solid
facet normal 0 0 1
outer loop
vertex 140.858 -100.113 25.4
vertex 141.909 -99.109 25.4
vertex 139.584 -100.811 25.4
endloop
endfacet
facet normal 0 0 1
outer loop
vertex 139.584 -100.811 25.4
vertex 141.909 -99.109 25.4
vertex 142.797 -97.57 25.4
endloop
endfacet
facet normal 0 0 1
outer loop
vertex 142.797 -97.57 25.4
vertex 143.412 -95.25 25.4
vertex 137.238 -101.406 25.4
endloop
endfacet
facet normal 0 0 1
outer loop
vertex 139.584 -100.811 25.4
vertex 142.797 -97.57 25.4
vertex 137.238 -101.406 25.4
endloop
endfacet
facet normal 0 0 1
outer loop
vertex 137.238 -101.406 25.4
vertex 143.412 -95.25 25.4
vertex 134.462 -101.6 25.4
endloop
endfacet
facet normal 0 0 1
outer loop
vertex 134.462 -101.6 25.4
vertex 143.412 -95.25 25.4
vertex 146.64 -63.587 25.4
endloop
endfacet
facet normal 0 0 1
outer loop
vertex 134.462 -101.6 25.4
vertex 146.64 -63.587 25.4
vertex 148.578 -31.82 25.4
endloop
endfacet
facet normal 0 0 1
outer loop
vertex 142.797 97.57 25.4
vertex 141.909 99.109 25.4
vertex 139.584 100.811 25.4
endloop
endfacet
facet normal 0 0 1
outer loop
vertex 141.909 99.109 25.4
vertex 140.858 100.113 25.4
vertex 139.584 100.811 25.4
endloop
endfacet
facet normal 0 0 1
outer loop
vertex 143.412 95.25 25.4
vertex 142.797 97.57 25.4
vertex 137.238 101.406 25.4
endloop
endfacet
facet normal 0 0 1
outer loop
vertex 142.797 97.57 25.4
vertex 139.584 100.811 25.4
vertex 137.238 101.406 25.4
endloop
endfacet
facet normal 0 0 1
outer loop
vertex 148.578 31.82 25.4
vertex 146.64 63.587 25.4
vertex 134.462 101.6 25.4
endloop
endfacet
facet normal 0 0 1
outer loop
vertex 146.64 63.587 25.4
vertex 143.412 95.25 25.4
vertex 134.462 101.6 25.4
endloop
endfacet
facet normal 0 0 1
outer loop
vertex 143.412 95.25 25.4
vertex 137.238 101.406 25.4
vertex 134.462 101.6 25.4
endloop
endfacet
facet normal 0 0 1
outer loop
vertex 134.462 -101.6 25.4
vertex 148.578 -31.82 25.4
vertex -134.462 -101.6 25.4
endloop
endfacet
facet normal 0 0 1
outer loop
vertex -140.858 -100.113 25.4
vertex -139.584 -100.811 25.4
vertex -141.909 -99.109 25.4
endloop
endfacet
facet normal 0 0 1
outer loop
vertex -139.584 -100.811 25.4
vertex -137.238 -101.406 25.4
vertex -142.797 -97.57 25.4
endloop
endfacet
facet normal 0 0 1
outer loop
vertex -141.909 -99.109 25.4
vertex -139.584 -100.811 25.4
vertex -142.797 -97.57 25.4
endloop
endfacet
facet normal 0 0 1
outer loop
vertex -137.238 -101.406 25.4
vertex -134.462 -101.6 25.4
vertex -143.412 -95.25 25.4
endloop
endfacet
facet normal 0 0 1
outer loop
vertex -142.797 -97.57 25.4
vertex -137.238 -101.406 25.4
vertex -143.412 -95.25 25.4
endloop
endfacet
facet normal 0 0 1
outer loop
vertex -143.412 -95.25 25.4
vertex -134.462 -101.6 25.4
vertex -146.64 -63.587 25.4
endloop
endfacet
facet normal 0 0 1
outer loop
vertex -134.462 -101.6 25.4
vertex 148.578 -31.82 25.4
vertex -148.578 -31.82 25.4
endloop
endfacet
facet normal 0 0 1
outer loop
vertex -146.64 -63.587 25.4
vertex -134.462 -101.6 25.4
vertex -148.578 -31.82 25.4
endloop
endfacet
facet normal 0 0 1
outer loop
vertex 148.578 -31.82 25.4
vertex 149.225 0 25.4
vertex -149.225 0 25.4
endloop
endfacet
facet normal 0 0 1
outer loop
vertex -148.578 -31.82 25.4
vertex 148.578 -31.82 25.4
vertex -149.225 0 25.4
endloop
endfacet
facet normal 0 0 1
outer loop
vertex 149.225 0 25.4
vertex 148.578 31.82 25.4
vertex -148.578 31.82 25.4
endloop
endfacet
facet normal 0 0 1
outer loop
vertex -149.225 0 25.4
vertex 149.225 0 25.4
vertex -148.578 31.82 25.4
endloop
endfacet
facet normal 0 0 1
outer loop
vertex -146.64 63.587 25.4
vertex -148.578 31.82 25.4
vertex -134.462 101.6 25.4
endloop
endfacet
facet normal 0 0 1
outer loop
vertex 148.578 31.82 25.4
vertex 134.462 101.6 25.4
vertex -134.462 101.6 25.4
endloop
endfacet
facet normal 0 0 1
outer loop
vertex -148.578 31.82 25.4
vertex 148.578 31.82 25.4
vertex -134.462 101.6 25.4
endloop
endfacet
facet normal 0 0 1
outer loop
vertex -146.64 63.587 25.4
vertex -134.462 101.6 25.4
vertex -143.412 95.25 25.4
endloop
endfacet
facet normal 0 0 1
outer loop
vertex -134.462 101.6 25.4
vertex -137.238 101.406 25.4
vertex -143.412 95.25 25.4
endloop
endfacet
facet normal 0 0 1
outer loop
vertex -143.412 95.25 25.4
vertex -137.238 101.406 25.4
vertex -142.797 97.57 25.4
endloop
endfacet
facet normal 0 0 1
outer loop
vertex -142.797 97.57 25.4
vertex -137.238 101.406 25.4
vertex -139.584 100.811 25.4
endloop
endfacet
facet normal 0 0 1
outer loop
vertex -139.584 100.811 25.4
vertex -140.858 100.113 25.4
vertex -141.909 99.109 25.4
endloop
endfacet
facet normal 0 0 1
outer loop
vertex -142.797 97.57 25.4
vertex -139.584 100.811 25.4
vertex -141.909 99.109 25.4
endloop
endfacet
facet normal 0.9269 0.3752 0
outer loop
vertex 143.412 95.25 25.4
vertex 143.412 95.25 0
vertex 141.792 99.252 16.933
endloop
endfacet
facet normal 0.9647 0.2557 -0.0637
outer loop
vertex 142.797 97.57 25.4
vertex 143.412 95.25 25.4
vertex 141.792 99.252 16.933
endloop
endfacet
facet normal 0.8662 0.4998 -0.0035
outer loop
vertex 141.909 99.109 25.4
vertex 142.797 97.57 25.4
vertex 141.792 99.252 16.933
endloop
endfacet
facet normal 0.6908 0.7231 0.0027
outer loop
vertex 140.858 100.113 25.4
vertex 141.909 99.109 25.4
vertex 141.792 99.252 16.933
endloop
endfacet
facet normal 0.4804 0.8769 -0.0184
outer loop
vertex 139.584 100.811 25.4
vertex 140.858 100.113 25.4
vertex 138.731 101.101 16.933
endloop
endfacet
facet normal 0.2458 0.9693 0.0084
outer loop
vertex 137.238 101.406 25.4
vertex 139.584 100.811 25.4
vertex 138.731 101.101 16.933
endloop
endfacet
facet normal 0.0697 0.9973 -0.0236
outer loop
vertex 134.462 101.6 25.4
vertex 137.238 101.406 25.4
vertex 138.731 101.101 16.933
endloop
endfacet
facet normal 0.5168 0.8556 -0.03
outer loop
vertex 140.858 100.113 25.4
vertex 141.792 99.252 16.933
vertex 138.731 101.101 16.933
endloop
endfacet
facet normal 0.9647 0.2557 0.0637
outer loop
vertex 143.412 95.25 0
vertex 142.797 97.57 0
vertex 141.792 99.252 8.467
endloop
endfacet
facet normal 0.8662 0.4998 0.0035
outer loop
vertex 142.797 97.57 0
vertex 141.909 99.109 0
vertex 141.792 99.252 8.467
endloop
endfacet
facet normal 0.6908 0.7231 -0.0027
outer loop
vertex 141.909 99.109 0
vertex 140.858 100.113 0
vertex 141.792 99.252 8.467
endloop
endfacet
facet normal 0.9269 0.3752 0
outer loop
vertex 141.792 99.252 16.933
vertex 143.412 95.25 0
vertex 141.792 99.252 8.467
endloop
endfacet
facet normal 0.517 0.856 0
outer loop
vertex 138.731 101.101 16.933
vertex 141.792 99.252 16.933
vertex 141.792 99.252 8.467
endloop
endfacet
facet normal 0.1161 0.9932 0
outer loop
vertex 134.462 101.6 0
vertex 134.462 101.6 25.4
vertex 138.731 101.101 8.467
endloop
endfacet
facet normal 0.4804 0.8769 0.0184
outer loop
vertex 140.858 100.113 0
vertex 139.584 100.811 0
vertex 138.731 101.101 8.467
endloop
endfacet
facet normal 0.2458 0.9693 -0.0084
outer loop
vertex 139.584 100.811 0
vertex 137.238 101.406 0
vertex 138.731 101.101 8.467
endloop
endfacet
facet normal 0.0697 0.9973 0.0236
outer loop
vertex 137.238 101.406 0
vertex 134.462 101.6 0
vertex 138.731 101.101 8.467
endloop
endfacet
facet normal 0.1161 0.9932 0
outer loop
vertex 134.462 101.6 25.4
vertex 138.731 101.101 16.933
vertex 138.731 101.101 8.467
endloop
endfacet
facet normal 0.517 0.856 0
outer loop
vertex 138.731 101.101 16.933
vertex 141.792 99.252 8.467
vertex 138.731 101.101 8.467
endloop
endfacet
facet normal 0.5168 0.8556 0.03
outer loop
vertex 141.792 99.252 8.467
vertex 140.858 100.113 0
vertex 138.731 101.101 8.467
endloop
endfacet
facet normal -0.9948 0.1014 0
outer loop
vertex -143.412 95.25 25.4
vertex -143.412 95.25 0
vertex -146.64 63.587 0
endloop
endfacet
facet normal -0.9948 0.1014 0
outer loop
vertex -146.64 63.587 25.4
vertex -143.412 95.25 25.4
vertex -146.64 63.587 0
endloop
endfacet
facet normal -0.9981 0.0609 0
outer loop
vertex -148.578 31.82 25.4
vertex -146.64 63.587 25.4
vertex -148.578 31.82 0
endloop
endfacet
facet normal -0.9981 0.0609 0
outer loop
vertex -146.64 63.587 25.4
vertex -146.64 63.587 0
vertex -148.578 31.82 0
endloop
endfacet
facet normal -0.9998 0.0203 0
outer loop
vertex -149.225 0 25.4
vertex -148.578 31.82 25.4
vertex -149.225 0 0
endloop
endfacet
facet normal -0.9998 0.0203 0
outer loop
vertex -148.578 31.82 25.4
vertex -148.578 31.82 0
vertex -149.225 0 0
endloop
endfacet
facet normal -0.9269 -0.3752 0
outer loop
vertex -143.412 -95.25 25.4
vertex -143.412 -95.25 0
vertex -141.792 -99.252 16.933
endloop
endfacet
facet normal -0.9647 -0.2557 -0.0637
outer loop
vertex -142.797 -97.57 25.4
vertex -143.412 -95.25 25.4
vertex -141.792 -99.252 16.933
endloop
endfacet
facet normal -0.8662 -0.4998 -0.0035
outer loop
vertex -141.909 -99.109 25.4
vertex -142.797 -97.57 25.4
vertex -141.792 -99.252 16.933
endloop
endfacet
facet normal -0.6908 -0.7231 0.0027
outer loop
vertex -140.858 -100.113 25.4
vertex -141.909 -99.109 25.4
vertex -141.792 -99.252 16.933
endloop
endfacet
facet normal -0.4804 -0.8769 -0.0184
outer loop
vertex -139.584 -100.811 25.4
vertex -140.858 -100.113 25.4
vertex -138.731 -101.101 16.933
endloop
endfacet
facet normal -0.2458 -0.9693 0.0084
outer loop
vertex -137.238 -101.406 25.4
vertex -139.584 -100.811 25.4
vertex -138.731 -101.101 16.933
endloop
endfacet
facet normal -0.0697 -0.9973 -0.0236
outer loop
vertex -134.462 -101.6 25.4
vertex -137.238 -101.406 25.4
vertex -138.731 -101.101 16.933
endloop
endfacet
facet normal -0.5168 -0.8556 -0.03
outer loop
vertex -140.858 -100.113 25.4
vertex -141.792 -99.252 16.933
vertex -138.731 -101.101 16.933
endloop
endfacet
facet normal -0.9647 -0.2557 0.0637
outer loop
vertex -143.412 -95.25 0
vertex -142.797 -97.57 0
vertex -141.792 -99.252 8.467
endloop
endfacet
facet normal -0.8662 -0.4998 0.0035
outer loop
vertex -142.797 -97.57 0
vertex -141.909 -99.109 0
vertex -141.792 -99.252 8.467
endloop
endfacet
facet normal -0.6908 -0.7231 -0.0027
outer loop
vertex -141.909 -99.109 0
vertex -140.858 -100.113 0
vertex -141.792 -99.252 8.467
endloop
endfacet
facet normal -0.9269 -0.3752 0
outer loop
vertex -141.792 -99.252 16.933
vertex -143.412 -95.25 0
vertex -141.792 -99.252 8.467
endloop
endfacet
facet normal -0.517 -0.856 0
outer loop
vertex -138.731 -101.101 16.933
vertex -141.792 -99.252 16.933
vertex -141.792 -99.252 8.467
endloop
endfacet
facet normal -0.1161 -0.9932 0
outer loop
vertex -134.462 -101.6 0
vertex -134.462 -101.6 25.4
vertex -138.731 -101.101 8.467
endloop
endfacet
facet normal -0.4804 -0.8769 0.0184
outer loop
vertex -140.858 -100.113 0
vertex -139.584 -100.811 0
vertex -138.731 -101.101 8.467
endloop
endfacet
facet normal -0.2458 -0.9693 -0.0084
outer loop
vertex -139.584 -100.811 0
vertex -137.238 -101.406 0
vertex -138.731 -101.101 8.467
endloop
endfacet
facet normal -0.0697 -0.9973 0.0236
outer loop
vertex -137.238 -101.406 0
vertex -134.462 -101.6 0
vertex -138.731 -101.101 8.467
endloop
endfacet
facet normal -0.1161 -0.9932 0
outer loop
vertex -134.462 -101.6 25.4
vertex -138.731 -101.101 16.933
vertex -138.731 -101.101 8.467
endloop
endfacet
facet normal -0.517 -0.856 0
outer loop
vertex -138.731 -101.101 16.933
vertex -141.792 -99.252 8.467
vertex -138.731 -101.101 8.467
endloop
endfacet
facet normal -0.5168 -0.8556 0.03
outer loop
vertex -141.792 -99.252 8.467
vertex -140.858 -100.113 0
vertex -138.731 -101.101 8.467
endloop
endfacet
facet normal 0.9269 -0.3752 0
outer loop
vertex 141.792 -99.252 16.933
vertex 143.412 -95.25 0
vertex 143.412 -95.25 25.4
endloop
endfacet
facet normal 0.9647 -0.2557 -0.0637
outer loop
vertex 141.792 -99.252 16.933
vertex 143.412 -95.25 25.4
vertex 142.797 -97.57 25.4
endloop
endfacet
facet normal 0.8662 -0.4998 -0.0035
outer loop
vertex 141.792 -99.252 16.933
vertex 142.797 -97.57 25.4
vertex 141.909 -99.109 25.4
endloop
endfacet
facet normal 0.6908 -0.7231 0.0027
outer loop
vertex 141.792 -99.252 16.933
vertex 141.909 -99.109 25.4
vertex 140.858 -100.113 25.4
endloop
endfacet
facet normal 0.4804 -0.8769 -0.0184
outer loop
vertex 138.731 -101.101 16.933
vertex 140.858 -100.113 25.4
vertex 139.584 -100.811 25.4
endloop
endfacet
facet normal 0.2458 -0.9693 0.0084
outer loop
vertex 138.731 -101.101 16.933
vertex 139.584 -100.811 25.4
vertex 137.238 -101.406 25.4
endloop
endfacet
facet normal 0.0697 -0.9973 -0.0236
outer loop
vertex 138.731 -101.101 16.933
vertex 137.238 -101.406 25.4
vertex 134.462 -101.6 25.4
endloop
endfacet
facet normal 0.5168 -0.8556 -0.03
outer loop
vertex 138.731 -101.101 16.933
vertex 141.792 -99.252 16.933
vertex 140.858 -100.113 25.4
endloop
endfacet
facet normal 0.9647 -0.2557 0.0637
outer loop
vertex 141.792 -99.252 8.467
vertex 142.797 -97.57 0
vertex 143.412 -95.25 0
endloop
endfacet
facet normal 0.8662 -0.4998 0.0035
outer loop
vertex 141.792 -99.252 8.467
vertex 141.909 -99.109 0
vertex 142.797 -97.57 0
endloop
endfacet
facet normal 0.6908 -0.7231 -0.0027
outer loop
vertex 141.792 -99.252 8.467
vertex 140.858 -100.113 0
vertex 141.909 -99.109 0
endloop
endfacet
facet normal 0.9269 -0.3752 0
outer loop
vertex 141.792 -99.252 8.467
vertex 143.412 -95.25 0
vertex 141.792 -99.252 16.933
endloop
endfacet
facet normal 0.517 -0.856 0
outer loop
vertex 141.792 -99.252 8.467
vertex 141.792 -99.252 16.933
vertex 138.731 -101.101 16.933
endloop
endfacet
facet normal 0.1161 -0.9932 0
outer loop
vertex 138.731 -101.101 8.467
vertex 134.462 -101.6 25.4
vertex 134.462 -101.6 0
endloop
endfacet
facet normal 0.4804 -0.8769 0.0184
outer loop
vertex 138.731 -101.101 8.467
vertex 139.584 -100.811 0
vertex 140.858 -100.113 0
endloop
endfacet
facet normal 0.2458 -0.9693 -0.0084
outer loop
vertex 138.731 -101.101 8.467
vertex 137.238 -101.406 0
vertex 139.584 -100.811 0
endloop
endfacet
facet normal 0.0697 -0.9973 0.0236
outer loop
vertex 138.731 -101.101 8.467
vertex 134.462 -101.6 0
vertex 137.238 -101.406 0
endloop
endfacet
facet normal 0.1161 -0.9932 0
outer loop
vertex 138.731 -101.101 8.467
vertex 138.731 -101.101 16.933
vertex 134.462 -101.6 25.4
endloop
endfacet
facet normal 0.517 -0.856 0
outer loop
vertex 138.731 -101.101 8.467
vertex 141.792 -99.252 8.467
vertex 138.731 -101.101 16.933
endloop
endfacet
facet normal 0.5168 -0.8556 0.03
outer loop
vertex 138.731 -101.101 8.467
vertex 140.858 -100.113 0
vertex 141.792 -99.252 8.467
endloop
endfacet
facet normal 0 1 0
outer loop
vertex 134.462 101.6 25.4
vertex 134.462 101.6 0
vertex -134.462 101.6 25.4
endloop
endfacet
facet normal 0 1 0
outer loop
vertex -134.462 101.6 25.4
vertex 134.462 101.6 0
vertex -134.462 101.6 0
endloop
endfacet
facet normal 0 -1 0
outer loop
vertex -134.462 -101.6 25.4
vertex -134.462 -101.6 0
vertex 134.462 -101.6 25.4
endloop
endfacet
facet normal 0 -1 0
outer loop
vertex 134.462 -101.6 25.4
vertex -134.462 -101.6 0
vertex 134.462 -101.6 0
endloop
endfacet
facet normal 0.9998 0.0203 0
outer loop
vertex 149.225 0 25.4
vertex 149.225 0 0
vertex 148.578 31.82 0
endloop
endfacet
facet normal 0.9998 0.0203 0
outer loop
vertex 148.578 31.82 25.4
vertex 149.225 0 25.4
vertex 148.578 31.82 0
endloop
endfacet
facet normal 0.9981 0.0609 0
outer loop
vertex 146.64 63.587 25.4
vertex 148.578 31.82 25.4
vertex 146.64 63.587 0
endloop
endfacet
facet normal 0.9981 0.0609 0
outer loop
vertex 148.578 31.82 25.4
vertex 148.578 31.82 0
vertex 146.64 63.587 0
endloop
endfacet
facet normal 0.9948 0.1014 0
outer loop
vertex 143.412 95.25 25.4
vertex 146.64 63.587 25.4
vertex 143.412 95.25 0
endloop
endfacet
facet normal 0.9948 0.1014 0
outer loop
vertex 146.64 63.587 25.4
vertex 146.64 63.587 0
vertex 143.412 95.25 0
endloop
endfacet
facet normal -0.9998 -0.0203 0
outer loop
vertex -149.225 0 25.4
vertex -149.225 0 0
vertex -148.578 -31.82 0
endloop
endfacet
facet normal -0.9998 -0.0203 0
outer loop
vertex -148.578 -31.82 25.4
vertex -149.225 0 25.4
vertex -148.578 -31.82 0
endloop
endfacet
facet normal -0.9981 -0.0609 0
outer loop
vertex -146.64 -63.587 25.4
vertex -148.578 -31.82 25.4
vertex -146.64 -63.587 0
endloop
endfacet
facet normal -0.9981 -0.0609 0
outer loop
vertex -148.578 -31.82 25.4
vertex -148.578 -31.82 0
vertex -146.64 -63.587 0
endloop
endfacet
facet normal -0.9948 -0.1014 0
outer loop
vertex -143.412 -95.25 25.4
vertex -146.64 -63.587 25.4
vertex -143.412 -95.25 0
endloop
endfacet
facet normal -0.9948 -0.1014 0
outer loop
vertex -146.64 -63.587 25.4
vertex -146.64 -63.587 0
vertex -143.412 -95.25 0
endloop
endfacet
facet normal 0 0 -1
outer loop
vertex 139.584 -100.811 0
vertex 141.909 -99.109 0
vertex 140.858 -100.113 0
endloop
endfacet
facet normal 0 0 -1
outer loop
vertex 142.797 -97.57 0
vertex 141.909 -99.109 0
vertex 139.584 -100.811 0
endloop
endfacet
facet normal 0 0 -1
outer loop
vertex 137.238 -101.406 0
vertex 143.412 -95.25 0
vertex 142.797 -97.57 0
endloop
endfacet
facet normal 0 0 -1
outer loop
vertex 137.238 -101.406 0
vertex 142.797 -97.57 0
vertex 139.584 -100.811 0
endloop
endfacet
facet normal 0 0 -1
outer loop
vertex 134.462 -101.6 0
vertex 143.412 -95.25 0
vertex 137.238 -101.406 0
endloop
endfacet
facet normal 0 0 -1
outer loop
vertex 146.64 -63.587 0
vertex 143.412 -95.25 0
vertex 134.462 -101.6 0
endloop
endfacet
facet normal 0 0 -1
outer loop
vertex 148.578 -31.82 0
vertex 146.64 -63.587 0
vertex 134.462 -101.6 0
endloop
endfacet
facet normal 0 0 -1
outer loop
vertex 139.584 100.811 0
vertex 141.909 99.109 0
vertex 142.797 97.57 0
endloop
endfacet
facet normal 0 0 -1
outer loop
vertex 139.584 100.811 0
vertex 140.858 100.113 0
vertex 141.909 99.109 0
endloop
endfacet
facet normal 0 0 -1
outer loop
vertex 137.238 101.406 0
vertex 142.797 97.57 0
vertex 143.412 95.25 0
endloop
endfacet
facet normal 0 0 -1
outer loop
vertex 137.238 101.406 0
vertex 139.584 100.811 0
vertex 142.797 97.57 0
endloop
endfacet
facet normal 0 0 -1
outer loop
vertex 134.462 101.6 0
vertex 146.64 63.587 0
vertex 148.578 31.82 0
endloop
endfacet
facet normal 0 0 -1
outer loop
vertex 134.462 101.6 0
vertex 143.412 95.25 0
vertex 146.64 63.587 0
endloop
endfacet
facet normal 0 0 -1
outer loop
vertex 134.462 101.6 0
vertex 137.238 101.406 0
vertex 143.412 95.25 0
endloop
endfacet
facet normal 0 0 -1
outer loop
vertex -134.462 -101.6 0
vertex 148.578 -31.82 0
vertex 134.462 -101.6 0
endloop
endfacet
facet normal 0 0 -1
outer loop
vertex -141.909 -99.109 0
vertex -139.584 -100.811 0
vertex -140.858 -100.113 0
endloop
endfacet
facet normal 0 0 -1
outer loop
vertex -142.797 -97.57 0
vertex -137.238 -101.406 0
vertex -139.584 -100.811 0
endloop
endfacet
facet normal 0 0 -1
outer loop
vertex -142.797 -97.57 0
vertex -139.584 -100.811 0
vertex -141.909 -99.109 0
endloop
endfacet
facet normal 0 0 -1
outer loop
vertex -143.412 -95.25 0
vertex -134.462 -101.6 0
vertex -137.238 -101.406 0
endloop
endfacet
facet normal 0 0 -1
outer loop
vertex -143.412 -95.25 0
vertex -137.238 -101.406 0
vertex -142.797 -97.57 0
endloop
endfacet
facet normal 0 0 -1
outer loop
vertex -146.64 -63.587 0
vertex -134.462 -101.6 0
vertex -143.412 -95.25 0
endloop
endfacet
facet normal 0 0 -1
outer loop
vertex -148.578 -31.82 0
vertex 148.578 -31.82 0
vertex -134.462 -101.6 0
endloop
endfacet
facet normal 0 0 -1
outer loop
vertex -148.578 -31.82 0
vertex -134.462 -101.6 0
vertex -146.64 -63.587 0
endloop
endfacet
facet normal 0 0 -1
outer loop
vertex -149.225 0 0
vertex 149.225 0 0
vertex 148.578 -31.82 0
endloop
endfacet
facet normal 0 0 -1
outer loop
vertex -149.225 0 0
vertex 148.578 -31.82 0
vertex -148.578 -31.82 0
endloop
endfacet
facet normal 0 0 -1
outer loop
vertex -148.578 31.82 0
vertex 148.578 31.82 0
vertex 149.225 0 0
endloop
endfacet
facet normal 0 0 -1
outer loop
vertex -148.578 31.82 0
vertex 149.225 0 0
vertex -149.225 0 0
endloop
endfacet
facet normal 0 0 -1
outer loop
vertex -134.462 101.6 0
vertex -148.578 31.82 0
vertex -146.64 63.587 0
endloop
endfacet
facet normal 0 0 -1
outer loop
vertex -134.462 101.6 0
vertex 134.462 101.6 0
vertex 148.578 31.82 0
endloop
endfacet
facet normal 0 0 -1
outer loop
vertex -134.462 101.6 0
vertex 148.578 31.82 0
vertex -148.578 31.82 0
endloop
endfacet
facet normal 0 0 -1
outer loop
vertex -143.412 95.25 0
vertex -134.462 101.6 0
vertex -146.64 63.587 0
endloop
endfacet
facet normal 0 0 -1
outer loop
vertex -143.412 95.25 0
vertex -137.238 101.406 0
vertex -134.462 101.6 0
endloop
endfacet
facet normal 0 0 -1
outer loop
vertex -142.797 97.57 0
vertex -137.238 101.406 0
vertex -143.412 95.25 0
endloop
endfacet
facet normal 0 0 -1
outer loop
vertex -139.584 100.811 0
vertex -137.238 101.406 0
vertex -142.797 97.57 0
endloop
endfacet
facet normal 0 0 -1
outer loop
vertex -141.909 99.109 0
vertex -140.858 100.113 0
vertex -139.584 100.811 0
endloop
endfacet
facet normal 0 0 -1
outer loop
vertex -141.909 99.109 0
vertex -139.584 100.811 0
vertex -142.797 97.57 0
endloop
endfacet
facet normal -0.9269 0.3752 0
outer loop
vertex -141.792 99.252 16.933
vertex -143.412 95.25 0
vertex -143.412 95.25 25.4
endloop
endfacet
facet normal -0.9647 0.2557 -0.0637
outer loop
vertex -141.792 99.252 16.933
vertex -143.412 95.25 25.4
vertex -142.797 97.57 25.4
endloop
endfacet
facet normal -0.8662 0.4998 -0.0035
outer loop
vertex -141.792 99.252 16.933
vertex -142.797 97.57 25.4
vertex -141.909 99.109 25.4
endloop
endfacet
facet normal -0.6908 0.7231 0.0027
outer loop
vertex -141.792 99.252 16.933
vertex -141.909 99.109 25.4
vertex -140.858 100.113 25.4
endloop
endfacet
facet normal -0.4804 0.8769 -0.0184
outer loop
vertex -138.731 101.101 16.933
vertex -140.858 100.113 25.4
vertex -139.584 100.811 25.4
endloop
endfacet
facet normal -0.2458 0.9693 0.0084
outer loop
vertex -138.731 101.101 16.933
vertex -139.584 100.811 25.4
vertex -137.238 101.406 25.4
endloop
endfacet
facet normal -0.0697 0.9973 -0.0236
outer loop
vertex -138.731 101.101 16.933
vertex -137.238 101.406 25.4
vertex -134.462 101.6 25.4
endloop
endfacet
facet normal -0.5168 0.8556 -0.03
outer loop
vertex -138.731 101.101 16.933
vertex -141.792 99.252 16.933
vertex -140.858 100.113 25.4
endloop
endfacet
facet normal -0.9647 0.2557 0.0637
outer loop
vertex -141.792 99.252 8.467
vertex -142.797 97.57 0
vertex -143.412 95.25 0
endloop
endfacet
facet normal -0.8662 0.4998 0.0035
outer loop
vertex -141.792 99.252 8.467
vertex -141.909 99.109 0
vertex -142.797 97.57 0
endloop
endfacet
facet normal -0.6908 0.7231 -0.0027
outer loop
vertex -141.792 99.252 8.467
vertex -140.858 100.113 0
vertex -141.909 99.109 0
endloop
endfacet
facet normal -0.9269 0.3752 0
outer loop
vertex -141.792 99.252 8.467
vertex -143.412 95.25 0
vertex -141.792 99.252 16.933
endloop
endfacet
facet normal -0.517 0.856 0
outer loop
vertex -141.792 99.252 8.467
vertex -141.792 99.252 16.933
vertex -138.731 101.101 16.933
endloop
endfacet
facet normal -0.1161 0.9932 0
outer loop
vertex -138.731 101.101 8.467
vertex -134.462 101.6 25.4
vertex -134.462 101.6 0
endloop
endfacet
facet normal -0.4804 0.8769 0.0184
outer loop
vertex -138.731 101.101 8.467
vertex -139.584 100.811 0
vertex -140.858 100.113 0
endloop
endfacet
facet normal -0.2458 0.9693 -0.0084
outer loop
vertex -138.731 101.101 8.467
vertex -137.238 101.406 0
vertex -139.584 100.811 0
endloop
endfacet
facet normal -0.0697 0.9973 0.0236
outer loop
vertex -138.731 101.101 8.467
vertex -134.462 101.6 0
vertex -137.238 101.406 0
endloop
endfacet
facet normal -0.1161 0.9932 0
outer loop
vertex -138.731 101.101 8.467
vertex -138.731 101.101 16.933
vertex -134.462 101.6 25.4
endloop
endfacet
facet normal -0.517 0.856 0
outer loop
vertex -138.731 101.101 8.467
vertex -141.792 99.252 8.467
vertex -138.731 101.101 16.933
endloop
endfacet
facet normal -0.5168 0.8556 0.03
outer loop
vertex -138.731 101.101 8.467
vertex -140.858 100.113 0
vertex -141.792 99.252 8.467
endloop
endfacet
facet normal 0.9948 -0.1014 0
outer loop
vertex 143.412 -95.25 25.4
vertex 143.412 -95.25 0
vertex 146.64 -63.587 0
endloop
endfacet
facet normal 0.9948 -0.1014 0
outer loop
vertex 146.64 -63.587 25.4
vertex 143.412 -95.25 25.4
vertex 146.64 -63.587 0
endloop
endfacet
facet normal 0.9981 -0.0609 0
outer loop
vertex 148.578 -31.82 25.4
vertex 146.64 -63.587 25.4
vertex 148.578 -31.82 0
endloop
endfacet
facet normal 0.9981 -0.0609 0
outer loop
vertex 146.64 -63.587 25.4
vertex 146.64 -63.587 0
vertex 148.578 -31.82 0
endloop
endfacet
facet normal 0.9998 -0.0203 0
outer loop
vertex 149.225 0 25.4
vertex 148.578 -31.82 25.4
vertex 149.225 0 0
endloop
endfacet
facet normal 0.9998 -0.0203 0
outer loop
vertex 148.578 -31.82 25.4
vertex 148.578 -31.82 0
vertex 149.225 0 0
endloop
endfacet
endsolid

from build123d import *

# Parameters (mm, degrees)
F1_DEPTH = 25.4


with BuildPart() as f1:
    # F0 (on Top) → F1 (new body)
    with BuildSketch(Plane.XY):
        with BuildLine():
            Line((0, 101.6), (-134.462427, 101.6))
            add(Edge.make_bspline(
                [(-143.412056, 95.25), (-142.589703, 100.594588), (-139.256909, 101.509474), (-134.462427, 101.6)],
                knots=[0, 0, 0, 0, 10.973529, 10.973529, 10.973529, 10.973529], degree=3))
            ThreePointArc((-143.412056, 95.25), (-147.770413, 47.713606), (-149.225, 0))
            ThreePointArc((-149.225, 0), (-147.770413, -47.713606), (-143.412056, -95.25))
            add(Edge.make_bspline(
                [(-143.412056, -95.25), (-142.589703, -100.594588), (-139.256909, -101.509474), (-134.462427, -101.6)],
                knots=[0, 0, 0, 0, 10.973529, 10.973529, 10.973529, 10.973529], degree=3))
            Line((-134.462427, -101.6), (0, -101.6))
            Line((0, -101.6), (134.462427, -101.6))
            add(Edge.make_bspline(
                [(143.412056, -95.25), (142.589703, -100.594588), (139.256909, -101.509474), (134.462427, -101.6)],
                knots=[0, 0, 0, 0, 10.973529, 10.973529, 10.973529, 10.973529], degree=3))
            ThreePointArc((143.412056, -95.25), (147.770413, -47.713606), (149.225, 0))
            ThreePointArc((149.225, 0), (147.770413, 47.713606), (143.412056, 95.25))
            add(Edge.make_bspline(
                [(143.412056, 95.25), (142.589703, 100.594588), (139.256909, 101.509474), (134.462427, 101.6)],
                knots=[0, 0, 0, 0, 10.973529, 10.973529, 10.973529, 10.973529], degree=3))
            Line((134.462427, 101.6), (0, 101.6))
        make_face()
    extrude(amount=F1_DEPTH)


solid = f1.part
